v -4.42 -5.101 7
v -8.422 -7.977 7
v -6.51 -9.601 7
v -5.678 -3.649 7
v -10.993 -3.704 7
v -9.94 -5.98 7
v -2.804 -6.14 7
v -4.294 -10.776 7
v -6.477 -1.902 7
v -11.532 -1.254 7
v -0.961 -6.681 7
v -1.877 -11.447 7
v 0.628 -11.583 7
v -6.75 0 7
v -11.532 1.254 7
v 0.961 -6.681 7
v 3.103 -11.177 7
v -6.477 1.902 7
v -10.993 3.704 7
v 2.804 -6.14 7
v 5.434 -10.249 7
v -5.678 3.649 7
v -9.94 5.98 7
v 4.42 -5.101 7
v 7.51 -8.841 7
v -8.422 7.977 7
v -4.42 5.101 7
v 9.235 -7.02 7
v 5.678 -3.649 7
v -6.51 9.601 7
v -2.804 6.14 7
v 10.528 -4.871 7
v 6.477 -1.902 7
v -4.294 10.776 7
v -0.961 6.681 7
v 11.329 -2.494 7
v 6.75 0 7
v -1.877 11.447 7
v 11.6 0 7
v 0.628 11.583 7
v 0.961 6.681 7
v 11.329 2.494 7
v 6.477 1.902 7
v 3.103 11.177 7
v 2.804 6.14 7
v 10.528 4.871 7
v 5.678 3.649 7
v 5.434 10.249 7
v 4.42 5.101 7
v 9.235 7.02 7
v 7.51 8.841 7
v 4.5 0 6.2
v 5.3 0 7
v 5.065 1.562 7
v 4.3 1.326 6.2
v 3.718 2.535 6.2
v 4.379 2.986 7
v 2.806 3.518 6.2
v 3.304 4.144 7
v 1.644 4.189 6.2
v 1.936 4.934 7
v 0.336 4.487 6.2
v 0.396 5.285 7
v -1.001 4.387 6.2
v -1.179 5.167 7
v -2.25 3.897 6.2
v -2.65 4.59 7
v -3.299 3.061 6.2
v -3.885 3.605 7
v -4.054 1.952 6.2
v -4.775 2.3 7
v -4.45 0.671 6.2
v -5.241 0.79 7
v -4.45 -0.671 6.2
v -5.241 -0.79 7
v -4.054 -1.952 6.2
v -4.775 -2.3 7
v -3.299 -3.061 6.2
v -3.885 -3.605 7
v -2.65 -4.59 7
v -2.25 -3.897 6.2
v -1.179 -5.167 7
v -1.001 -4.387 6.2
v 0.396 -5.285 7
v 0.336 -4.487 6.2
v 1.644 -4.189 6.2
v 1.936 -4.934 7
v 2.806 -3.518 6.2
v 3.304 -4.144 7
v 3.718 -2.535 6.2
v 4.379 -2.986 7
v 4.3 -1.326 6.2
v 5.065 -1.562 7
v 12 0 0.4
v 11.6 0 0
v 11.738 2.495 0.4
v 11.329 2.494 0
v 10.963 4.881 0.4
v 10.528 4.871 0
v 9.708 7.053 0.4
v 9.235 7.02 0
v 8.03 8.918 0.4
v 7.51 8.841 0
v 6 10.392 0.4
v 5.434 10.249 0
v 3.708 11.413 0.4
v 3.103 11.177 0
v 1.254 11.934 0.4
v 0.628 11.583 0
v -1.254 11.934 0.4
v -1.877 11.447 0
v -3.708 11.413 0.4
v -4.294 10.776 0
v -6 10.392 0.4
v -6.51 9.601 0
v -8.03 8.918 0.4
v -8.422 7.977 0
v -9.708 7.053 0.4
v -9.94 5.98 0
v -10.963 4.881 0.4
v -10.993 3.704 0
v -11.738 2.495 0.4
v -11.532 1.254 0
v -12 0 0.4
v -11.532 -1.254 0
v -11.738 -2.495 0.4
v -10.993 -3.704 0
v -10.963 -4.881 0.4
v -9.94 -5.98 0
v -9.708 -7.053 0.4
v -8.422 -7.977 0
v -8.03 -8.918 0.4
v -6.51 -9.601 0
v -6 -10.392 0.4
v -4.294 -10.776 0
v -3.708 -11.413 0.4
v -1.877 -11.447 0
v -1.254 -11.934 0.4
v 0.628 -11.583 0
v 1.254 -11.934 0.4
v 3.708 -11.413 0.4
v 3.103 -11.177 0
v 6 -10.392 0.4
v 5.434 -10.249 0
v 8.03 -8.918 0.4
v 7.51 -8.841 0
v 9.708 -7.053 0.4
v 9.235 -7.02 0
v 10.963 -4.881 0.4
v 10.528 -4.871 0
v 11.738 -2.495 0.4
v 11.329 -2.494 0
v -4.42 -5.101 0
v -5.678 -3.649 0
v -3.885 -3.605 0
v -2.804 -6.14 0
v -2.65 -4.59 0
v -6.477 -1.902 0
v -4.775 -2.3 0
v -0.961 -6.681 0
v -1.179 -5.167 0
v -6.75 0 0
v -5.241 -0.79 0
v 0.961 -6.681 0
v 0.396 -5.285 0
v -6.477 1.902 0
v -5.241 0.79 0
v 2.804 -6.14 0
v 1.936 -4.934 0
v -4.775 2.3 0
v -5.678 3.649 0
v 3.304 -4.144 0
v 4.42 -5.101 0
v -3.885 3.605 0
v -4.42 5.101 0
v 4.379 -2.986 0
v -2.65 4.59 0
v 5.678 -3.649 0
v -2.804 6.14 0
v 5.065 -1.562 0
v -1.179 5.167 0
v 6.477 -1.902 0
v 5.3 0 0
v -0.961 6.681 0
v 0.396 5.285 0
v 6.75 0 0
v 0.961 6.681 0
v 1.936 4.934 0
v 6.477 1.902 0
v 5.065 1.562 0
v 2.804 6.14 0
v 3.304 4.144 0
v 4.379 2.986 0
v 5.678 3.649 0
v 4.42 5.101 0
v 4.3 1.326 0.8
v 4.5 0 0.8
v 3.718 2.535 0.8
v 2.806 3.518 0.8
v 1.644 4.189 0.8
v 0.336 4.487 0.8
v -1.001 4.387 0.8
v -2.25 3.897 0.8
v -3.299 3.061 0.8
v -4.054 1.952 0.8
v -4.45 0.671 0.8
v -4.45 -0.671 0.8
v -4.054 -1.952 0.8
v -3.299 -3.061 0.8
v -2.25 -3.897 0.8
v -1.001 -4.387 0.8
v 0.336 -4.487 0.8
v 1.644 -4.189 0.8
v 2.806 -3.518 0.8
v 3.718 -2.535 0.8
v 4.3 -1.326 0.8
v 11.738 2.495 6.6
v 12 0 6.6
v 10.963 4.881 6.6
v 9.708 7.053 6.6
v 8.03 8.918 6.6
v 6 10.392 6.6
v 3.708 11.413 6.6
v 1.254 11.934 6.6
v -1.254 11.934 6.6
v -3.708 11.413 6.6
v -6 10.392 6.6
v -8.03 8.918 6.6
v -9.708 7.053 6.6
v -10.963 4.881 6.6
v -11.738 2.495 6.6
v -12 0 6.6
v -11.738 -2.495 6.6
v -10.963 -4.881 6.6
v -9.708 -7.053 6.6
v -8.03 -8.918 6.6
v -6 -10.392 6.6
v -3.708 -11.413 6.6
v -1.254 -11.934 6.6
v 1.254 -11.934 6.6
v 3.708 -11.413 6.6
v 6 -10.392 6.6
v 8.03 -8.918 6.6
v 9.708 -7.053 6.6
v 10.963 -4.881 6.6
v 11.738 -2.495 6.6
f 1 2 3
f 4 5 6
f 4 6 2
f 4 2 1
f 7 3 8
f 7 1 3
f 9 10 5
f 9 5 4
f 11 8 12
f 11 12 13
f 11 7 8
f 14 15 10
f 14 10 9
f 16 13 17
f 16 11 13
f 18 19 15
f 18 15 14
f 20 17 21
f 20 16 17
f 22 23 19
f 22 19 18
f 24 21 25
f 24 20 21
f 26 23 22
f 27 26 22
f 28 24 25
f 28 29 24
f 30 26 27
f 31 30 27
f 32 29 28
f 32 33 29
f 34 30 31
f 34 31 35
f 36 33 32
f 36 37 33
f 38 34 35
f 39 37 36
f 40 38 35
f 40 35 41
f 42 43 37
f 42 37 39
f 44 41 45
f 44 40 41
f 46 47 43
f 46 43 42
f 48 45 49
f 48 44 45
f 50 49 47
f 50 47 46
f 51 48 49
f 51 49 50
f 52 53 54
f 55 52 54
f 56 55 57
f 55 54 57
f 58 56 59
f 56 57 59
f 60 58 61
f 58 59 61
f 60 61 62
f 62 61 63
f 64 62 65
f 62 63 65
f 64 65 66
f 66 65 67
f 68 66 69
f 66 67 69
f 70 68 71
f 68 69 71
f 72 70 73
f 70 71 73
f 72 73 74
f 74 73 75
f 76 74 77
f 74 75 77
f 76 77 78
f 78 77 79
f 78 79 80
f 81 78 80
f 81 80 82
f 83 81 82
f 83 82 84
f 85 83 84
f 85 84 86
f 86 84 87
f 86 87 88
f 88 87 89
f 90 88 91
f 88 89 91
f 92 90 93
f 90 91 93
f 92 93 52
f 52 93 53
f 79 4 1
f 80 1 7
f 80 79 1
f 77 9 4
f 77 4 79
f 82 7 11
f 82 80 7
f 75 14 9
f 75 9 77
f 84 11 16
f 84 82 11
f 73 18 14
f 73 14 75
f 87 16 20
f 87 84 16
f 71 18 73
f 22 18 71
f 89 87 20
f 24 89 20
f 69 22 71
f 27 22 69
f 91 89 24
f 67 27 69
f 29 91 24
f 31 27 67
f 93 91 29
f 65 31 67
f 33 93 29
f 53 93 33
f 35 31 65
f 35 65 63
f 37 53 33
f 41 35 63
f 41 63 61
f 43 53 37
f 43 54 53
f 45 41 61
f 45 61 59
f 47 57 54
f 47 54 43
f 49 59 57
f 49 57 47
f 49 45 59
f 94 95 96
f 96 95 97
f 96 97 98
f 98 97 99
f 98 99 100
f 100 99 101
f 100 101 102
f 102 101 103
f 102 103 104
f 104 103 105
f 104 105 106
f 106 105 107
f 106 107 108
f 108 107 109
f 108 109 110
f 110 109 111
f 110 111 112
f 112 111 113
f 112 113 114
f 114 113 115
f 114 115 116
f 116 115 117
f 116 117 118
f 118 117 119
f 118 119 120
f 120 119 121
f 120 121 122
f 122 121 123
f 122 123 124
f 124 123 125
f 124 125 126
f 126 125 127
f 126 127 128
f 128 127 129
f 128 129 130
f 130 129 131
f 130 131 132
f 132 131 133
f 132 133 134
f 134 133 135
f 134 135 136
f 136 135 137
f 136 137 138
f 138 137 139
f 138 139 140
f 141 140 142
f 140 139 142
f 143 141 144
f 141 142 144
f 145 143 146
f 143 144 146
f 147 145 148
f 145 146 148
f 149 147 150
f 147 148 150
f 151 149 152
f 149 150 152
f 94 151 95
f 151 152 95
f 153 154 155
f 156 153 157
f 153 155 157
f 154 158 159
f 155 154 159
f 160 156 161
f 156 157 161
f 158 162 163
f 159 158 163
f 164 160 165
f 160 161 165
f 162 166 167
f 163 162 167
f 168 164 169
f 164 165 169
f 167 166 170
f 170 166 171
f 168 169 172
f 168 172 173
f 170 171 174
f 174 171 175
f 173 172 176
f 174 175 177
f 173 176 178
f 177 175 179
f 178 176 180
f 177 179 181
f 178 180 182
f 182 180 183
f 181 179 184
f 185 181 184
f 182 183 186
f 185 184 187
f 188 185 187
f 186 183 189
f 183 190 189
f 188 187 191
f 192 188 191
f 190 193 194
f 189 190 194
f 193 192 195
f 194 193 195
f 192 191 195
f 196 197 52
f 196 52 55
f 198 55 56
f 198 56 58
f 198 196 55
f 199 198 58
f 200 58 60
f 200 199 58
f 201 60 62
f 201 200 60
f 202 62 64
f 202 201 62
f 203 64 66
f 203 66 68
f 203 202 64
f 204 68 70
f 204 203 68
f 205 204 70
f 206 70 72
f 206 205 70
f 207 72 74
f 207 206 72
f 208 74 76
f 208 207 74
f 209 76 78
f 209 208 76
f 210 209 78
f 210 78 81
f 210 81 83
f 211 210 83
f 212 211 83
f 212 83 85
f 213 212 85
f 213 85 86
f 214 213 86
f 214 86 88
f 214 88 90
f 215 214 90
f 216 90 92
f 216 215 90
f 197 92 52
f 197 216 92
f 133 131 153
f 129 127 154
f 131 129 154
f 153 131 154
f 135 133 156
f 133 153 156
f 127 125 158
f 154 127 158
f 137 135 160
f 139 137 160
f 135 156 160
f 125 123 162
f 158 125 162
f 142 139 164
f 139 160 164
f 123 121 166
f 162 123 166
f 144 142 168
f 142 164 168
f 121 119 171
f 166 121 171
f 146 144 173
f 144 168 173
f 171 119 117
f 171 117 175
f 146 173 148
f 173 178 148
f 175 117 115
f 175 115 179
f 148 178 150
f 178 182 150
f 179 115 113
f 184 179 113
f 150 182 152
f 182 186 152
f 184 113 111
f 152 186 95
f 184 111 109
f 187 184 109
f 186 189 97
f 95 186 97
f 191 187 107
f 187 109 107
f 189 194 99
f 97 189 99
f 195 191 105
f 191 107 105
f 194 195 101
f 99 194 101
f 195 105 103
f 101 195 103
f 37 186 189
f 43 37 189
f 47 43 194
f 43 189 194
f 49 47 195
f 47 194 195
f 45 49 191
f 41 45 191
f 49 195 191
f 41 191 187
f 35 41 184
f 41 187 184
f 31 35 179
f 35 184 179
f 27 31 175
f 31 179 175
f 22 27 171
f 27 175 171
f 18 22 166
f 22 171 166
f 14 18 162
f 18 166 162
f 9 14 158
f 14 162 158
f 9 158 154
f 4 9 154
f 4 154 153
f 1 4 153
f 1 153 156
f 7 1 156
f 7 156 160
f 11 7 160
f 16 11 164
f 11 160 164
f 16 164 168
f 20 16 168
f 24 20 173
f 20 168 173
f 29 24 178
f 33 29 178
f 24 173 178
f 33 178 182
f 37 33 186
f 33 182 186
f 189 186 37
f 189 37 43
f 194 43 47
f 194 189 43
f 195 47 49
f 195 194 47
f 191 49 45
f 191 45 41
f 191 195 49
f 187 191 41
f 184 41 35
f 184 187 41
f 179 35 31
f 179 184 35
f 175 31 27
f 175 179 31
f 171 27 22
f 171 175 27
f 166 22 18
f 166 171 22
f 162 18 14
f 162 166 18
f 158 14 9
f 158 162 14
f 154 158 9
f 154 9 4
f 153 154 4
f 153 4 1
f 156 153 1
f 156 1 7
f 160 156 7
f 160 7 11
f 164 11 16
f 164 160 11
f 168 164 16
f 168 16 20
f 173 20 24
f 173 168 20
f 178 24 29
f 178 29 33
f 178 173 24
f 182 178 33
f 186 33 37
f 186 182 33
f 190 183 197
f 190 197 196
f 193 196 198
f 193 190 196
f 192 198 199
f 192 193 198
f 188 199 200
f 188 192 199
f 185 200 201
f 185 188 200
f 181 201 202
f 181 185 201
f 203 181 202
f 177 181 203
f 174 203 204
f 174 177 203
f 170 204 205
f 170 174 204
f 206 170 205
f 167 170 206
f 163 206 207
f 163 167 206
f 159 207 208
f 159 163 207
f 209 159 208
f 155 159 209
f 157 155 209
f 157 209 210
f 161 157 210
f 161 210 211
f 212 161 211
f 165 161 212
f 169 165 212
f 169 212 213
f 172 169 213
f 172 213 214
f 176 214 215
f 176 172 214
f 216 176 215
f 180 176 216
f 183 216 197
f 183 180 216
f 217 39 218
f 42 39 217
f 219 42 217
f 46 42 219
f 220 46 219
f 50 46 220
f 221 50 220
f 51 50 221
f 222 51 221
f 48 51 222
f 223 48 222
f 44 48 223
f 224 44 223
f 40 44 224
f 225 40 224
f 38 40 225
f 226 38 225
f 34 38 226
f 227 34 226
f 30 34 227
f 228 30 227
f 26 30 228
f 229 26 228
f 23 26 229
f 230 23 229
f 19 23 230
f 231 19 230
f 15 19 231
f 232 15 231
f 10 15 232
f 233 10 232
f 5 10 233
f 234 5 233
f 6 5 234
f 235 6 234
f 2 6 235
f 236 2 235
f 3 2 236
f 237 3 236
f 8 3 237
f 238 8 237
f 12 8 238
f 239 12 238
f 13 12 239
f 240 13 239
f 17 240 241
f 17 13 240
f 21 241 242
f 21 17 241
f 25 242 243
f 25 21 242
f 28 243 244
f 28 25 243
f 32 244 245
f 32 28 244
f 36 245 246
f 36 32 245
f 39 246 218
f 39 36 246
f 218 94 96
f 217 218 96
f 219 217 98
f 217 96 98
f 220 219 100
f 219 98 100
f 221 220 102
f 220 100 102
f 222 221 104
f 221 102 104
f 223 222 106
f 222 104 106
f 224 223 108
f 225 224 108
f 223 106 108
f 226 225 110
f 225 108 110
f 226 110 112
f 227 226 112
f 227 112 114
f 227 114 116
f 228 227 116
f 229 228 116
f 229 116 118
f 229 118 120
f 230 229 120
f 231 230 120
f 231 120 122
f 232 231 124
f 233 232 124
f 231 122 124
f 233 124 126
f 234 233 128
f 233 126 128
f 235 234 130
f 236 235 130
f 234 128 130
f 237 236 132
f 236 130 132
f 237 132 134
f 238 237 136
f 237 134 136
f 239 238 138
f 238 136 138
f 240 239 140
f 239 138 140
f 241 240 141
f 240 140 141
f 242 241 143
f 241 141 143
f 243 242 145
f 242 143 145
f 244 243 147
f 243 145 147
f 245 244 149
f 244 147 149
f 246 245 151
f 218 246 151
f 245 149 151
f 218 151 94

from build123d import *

# Parameters (mm, degrees)
F0_R     = 12
F0_R_2   = 6.75
F1_DEPTH = 7
F0_R_3   = 4.5
F2_DEPTH = 7
F3_SIZE  = 0.4
F4_SIZE  = 0.8


with BuildPart() as f1:
    # F0 (on Top) → F1 (new body)
    with BuildSketch(Plane.XY):
        Circle(F0_R)
        Circle(F0_R_2, mode=Mode.SUBTRACT)
    extrude(amount=F1_DEPTH)

    # F3
    f3_edges = [f1.edges().sort_by_distance(p)[0] for p in [
        (-12, 0, 7),
        (-12, 0, 0),
    ]]
    chamfer(f3_edges, length=F3_SIZE)


with BuildPart() as f2:
    # F0 (on Top) → F2 (new body)
    with BuildSketch(Plane.XY):
        Circle(F0_R_2)
        Circle(F0_R_3, mode=Mode.SUBTRACT)
    extrude(amount=F2_DEPTH)

    # F4
    f4_edges = [f2.edges().sort_by_distance(p)[0] for p in [
        (-4.5, 0, 7),
        (-4.5, 0, 0),
    ]]
    chamfer(f4_edges, length=F4_SIZE)


solid = Compound([f1.part, f2.part])
